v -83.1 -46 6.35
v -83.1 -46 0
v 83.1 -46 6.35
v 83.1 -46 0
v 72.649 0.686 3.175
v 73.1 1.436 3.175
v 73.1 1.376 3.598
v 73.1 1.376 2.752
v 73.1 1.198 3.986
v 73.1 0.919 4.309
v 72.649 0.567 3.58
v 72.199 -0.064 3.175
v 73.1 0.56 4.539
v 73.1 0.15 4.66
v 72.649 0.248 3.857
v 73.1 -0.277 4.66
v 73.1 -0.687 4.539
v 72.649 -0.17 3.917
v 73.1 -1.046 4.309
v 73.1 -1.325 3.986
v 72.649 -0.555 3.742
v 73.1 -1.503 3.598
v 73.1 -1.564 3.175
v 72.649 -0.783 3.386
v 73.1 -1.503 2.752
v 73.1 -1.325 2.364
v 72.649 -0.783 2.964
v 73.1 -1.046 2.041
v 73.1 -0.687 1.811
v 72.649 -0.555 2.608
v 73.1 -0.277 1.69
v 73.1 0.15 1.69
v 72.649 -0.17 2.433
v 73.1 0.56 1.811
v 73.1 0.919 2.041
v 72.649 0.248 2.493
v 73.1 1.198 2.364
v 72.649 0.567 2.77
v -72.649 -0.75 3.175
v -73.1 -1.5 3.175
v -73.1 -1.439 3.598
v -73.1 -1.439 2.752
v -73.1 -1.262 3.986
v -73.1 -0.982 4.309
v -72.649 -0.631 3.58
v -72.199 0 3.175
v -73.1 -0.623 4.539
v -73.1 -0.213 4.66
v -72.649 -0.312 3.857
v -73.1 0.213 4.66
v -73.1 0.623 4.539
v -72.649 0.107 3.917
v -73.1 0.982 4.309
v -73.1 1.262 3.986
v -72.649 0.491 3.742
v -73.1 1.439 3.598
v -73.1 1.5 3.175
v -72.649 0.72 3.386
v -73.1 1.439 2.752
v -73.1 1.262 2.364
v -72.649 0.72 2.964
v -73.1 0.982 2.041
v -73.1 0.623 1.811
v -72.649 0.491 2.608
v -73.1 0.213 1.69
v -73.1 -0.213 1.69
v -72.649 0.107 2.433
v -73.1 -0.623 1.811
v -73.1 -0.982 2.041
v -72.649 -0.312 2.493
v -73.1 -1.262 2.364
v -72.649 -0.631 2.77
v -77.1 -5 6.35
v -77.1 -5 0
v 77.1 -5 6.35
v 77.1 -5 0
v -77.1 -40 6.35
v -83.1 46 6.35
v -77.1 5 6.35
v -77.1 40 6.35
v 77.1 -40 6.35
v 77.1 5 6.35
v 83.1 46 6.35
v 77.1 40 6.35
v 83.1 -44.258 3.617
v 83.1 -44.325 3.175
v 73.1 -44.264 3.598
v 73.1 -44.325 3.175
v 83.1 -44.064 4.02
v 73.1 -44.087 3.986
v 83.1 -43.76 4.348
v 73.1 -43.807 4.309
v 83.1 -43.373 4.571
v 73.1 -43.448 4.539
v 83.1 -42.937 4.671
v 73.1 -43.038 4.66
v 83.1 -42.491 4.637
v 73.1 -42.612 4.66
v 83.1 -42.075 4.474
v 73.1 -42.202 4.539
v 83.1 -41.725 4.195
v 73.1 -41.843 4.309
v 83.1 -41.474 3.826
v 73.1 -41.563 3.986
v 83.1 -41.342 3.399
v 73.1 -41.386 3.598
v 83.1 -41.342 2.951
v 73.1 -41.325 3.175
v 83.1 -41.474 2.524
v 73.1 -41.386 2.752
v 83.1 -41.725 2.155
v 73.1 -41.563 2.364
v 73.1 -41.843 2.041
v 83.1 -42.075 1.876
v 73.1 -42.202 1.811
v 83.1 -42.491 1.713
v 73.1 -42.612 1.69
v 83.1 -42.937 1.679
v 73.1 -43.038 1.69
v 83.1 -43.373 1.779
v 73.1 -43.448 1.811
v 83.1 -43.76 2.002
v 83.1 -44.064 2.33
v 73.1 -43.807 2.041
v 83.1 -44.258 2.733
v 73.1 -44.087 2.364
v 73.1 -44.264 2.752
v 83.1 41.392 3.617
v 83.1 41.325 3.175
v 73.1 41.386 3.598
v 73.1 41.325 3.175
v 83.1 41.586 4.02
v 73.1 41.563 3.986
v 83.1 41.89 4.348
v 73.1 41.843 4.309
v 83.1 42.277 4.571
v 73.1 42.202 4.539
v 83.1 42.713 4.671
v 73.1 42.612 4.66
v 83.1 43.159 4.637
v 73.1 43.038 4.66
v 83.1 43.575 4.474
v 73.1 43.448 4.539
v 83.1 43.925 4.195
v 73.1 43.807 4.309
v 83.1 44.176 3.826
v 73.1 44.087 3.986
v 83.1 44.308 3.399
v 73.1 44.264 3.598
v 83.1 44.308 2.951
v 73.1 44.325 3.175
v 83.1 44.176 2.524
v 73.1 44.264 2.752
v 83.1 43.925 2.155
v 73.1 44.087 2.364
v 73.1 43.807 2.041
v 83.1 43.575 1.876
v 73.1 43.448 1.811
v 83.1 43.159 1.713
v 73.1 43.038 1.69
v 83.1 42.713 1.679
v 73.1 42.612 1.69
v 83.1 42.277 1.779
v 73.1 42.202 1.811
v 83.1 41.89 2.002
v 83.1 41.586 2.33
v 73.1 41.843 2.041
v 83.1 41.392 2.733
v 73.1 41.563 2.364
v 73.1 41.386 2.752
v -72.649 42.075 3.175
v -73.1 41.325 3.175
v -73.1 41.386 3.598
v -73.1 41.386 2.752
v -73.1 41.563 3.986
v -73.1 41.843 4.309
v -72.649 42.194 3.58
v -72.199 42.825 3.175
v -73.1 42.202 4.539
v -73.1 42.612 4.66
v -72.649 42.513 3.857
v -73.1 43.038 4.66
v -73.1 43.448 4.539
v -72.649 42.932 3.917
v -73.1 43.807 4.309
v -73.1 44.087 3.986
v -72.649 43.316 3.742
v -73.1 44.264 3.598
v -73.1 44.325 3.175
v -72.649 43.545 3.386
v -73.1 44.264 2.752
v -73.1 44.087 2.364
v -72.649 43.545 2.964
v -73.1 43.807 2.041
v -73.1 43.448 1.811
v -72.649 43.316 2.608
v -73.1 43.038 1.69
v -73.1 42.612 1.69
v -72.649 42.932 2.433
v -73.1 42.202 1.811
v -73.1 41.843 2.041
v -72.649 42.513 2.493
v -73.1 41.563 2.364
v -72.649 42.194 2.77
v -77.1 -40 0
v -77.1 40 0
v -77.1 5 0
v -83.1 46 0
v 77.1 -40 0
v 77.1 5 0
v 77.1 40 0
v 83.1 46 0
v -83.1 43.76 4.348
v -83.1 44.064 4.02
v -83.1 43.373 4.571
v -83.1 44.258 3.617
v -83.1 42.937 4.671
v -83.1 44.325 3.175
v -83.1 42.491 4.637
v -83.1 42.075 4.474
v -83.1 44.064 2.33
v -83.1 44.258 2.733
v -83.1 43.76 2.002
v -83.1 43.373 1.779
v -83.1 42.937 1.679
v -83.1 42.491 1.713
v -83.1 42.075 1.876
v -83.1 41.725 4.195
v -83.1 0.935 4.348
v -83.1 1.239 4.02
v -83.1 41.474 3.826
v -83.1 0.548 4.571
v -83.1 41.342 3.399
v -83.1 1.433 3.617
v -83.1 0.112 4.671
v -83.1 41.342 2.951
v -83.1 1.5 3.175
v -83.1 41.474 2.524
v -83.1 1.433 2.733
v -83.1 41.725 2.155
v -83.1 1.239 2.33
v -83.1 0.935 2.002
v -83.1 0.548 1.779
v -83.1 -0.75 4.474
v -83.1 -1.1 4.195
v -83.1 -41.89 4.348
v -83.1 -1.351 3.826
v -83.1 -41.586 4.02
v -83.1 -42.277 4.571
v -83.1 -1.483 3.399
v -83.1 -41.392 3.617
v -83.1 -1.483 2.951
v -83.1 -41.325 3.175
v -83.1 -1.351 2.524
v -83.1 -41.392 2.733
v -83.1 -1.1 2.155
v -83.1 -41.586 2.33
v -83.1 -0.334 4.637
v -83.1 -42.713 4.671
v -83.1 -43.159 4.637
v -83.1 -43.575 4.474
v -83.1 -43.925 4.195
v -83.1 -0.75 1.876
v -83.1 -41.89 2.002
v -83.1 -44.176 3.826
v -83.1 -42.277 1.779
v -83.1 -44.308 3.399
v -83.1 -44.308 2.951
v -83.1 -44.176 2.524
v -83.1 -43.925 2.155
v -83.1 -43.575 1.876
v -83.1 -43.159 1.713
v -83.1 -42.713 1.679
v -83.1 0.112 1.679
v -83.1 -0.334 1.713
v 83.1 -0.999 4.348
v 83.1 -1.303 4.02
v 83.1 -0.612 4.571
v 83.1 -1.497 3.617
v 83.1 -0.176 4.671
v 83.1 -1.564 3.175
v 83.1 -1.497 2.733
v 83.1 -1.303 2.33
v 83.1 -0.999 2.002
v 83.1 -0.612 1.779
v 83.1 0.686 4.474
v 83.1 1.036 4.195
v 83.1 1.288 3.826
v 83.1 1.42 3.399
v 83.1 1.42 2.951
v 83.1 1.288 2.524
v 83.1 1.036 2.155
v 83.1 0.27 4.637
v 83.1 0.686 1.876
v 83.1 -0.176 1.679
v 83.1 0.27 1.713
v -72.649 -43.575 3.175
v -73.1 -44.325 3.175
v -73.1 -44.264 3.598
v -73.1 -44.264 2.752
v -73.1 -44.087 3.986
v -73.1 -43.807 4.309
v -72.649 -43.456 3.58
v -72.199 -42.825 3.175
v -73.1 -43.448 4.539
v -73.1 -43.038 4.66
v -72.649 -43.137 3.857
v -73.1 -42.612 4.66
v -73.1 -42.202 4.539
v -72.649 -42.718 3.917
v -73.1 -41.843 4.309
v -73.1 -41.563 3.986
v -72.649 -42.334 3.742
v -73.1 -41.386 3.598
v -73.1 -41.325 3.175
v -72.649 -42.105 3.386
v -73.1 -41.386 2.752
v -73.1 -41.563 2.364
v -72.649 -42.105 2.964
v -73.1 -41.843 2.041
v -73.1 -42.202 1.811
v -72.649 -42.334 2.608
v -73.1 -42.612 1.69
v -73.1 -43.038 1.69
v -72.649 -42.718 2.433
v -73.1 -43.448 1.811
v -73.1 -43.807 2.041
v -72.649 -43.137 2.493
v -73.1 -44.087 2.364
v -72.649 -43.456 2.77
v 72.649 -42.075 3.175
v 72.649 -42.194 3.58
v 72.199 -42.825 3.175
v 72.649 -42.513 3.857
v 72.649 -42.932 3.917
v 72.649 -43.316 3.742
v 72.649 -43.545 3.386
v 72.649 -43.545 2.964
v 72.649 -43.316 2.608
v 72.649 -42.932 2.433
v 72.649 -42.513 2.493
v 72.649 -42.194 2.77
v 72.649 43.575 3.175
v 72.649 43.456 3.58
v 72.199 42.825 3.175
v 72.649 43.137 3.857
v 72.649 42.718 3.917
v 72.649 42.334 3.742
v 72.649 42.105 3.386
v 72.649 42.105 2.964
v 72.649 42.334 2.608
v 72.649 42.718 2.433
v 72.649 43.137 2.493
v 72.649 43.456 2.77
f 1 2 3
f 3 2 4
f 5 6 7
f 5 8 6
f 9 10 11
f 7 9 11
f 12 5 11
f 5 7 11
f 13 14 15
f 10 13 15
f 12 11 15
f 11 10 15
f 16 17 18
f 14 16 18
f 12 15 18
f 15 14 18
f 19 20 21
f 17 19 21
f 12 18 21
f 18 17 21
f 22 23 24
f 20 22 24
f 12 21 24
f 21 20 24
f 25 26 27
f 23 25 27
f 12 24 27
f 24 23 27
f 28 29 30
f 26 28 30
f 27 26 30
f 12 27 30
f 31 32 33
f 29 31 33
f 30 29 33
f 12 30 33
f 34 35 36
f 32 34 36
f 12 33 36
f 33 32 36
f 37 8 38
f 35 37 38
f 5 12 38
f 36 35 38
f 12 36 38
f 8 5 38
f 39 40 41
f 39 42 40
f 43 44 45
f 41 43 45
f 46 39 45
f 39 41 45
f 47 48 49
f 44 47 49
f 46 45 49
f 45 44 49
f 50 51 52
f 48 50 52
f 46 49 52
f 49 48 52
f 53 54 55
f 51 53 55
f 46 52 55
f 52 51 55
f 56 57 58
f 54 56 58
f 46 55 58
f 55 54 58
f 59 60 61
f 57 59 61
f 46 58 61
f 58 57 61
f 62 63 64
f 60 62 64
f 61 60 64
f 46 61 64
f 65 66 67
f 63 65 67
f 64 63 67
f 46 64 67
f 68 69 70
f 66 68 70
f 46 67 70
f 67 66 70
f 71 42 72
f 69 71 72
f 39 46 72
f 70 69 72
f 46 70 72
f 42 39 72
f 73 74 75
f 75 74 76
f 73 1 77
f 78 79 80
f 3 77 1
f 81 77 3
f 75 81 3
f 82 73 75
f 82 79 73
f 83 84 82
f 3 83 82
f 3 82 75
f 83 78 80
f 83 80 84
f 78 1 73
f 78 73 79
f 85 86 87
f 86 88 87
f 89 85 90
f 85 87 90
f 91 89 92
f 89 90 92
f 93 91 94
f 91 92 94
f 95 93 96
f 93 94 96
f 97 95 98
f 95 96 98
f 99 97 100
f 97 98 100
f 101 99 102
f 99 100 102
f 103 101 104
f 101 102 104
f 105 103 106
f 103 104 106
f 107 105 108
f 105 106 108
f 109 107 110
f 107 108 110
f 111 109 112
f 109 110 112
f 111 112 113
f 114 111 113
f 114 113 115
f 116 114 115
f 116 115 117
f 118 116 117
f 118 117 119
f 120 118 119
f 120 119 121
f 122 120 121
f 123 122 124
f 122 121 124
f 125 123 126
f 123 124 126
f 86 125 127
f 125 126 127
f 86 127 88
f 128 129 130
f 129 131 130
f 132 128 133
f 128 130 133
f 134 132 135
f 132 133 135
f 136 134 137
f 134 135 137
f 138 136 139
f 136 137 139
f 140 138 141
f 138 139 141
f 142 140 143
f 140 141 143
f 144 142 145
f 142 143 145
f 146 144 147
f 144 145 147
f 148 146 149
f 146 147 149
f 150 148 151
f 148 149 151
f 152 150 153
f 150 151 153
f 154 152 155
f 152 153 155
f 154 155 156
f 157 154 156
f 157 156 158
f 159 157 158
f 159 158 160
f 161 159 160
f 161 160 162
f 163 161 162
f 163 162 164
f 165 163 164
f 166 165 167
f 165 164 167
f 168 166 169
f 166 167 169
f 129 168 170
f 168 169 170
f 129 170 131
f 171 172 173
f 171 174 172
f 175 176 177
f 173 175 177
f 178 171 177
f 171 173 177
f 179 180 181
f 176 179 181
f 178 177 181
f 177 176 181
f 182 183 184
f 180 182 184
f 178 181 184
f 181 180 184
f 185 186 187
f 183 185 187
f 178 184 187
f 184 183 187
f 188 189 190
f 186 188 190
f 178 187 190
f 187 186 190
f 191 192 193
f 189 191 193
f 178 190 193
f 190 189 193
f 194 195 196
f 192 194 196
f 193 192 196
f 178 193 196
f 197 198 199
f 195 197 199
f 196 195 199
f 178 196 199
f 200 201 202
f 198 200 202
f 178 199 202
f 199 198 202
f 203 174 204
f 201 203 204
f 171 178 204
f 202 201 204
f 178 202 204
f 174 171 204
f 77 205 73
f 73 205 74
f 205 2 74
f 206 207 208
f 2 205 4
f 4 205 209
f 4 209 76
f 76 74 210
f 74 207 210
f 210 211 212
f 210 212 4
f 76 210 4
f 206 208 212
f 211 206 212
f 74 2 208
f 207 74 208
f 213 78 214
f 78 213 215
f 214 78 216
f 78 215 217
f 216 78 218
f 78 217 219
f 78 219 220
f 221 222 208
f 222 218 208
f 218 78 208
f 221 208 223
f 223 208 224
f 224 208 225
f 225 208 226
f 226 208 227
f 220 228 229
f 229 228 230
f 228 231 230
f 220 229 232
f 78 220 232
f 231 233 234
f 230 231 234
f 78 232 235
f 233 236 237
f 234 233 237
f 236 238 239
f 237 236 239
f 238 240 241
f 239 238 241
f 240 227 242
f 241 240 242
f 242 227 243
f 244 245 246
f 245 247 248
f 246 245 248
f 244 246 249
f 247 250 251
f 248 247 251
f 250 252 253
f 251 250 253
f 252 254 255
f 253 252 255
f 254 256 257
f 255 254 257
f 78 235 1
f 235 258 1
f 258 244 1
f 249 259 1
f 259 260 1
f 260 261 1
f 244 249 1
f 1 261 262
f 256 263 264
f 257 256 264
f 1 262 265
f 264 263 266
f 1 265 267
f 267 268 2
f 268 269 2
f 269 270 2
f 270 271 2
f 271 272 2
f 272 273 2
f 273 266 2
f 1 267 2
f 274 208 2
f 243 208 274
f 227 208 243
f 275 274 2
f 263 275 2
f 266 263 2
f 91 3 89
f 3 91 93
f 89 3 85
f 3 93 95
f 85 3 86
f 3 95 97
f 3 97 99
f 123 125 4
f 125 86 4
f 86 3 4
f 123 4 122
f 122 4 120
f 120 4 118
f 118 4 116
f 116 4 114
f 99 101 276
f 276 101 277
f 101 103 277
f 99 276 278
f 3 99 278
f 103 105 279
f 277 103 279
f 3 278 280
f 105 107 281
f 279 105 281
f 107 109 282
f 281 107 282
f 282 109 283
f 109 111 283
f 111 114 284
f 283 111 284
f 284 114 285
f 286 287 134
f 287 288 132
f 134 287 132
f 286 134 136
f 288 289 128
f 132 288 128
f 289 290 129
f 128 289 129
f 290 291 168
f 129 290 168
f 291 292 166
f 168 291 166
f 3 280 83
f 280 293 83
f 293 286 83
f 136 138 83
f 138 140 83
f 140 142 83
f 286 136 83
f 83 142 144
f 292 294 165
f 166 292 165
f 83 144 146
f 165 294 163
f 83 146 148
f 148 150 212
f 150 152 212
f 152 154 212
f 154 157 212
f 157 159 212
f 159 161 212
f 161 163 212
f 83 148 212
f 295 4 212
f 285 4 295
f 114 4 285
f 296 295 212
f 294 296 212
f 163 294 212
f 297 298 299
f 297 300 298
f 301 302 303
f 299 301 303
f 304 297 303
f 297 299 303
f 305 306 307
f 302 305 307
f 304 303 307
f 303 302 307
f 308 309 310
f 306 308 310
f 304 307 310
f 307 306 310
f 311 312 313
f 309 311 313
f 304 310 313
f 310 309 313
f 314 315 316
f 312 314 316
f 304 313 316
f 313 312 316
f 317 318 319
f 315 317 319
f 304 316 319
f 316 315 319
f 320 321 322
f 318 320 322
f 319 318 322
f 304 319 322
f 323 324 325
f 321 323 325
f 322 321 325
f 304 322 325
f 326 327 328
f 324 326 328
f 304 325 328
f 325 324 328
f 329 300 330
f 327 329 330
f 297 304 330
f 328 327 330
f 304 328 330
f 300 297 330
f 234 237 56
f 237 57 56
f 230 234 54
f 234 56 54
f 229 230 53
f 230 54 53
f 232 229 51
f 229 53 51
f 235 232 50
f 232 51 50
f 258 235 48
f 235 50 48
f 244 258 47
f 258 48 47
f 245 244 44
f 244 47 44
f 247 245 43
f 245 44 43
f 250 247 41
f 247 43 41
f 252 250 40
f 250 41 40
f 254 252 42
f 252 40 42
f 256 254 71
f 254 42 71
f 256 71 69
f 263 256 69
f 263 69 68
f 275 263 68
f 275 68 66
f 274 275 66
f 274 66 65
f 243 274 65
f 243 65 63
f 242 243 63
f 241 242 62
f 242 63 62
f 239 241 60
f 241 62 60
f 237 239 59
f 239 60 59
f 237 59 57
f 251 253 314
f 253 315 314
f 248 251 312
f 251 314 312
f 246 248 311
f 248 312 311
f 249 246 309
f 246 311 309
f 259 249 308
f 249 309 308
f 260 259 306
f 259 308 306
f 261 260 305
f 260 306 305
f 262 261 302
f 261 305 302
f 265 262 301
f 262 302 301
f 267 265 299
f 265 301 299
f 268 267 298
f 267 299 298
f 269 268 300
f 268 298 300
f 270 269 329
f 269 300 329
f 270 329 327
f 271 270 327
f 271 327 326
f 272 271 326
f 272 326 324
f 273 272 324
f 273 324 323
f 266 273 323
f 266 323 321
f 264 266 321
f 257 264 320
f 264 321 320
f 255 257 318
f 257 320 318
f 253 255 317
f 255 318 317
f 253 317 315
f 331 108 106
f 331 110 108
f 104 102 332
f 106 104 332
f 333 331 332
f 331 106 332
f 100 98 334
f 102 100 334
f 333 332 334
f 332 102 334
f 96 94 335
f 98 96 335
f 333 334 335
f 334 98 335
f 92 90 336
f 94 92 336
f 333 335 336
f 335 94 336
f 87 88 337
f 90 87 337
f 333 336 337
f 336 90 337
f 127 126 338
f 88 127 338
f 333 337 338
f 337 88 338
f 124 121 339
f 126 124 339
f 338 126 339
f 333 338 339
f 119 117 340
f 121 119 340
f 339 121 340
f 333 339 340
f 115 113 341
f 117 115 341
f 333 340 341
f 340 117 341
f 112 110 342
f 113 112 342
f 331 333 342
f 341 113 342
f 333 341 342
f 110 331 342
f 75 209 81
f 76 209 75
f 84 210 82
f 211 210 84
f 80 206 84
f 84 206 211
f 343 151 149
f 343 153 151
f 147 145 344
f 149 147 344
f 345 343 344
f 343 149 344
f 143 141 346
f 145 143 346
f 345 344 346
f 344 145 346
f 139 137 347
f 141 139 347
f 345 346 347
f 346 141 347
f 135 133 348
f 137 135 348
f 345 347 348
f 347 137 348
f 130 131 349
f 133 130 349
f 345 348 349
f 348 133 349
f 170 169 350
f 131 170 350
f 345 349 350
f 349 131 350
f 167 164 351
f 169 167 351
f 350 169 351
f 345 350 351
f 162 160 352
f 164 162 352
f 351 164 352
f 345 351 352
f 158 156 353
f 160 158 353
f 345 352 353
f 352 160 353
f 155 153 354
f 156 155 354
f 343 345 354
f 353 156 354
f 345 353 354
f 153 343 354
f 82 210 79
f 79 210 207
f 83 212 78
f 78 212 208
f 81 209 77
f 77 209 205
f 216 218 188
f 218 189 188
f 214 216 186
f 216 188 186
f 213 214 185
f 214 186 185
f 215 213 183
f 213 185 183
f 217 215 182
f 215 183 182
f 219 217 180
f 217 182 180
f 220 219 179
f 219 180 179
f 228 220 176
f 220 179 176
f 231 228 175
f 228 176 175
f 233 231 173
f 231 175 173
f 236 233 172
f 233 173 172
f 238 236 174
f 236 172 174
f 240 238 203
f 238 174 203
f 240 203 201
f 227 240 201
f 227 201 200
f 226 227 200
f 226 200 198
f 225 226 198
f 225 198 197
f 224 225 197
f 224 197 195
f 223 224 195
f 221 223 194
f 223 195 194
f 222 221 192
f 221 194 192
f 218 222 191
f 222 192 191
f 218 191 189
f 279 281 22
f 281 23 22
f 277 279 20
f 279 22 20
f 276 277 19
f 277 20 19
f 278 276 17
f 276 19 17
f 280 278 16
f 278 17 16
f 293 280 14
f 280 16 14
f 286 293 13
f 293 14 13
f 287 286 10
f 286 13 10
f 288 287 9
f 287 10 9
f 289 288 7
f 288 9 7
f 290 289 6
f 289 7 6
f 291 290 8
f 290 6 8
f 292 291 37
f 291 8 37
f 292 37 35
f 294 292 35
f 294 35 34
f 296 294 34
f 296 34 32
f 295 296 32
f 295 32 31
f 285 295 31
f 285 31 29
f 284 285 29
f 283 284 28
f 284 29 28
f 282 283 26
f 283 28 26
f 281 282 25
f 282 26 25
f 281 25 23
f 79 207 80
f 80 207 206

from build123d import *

# Parameters (mm, degrees)
F0_W     = 6
F0_H     = 6
F0_W_2   = 154.2
F0_H_2   = 10
F0_H_3   = 35
F1_DEPTH = 6.35
F3_D     = 3
F3_DEPTH = 10
F3_TIP   = 0.9012909285
F5_D     = 3
F5_DEPTH = 10
F5_TIP   = 0.9012909285


with BuildPart() as f1:
    # F0 (on Top) → F1 (new body)
    with BuildSketch(Plane.XY):
        with Locations((80.1, -43)):
            Rectangle(F0_W, F0_H)
        with Locations((0, -43)):
            Rectangle(F0_W_2, F0_H)
        with Locations((-80.1, -43)):
            Rectangle(F0_W, F0_H)
        with Locations((80.1, 43)):
            Rectangle(F0_W, F0_H)
        with Locations((0, 43)):
            Rectangle(F0_W_2, F0_H)
        with Locations((-80.1, 43)):
            Rectangle(F0_W, F0_H)
        with Locations((80.1, 0)):
            Rectangle(F0_W, F0_H_2)
        Rectangle(F0_W_2, F0_H_2)
        with Locations((-80.1, 0)):
            Rectangle(F0_W, F0_H_2)
        with Locations((-80.1, 22.5)):
            Rectangle(F0_W, F0_H_3)
        with Locations((-80.1, -22.5)):
            Rectangle(F0_W, F0_H_3)
        with Locations((80.1, 22.5)):
            Rectangle(F0_W, F0_H_3)
        with Locations((80.1, -22.5)):
            Rectangle(F0_W, F0_H_3)
    extrude(amount=F1_DEPTH)

    # F3
    with Locations(Plane(origin=(-83.1, 0, 0), x_dir=(0, -1, 0), z_dir=(-1, 0, 0))):
        with Locations((-42.825, 3.175), (0, 3.175), (42.825, 3.175)):
            Hole(F3_D / 2, depth=F3_DEPTH)
            with Locations((0, 0, -(F3_DEPTH + F3_TIP / 2))):  # 118° drill point
                Cone(0, F3_D / 2, F3_TIP, mode=Mode.SUBTRACT)

    # F5
    with Locations(Plane.YZ.offset(83.1)):
        with Locations((-0.0635787927, 3.175), (-42.825, 3.175), (42.825, 3.175)):
            Hole(F5_D / 2, depth=F5_DEPTH)
            with Locations((0, 0, -(F5_DEPTH + F5_TIP / 2))):  # 118° drill point
                Cone(0, F5_D / 2, F5_TIP, mode=Mode.SUBTRACT)


solid = f1.part
